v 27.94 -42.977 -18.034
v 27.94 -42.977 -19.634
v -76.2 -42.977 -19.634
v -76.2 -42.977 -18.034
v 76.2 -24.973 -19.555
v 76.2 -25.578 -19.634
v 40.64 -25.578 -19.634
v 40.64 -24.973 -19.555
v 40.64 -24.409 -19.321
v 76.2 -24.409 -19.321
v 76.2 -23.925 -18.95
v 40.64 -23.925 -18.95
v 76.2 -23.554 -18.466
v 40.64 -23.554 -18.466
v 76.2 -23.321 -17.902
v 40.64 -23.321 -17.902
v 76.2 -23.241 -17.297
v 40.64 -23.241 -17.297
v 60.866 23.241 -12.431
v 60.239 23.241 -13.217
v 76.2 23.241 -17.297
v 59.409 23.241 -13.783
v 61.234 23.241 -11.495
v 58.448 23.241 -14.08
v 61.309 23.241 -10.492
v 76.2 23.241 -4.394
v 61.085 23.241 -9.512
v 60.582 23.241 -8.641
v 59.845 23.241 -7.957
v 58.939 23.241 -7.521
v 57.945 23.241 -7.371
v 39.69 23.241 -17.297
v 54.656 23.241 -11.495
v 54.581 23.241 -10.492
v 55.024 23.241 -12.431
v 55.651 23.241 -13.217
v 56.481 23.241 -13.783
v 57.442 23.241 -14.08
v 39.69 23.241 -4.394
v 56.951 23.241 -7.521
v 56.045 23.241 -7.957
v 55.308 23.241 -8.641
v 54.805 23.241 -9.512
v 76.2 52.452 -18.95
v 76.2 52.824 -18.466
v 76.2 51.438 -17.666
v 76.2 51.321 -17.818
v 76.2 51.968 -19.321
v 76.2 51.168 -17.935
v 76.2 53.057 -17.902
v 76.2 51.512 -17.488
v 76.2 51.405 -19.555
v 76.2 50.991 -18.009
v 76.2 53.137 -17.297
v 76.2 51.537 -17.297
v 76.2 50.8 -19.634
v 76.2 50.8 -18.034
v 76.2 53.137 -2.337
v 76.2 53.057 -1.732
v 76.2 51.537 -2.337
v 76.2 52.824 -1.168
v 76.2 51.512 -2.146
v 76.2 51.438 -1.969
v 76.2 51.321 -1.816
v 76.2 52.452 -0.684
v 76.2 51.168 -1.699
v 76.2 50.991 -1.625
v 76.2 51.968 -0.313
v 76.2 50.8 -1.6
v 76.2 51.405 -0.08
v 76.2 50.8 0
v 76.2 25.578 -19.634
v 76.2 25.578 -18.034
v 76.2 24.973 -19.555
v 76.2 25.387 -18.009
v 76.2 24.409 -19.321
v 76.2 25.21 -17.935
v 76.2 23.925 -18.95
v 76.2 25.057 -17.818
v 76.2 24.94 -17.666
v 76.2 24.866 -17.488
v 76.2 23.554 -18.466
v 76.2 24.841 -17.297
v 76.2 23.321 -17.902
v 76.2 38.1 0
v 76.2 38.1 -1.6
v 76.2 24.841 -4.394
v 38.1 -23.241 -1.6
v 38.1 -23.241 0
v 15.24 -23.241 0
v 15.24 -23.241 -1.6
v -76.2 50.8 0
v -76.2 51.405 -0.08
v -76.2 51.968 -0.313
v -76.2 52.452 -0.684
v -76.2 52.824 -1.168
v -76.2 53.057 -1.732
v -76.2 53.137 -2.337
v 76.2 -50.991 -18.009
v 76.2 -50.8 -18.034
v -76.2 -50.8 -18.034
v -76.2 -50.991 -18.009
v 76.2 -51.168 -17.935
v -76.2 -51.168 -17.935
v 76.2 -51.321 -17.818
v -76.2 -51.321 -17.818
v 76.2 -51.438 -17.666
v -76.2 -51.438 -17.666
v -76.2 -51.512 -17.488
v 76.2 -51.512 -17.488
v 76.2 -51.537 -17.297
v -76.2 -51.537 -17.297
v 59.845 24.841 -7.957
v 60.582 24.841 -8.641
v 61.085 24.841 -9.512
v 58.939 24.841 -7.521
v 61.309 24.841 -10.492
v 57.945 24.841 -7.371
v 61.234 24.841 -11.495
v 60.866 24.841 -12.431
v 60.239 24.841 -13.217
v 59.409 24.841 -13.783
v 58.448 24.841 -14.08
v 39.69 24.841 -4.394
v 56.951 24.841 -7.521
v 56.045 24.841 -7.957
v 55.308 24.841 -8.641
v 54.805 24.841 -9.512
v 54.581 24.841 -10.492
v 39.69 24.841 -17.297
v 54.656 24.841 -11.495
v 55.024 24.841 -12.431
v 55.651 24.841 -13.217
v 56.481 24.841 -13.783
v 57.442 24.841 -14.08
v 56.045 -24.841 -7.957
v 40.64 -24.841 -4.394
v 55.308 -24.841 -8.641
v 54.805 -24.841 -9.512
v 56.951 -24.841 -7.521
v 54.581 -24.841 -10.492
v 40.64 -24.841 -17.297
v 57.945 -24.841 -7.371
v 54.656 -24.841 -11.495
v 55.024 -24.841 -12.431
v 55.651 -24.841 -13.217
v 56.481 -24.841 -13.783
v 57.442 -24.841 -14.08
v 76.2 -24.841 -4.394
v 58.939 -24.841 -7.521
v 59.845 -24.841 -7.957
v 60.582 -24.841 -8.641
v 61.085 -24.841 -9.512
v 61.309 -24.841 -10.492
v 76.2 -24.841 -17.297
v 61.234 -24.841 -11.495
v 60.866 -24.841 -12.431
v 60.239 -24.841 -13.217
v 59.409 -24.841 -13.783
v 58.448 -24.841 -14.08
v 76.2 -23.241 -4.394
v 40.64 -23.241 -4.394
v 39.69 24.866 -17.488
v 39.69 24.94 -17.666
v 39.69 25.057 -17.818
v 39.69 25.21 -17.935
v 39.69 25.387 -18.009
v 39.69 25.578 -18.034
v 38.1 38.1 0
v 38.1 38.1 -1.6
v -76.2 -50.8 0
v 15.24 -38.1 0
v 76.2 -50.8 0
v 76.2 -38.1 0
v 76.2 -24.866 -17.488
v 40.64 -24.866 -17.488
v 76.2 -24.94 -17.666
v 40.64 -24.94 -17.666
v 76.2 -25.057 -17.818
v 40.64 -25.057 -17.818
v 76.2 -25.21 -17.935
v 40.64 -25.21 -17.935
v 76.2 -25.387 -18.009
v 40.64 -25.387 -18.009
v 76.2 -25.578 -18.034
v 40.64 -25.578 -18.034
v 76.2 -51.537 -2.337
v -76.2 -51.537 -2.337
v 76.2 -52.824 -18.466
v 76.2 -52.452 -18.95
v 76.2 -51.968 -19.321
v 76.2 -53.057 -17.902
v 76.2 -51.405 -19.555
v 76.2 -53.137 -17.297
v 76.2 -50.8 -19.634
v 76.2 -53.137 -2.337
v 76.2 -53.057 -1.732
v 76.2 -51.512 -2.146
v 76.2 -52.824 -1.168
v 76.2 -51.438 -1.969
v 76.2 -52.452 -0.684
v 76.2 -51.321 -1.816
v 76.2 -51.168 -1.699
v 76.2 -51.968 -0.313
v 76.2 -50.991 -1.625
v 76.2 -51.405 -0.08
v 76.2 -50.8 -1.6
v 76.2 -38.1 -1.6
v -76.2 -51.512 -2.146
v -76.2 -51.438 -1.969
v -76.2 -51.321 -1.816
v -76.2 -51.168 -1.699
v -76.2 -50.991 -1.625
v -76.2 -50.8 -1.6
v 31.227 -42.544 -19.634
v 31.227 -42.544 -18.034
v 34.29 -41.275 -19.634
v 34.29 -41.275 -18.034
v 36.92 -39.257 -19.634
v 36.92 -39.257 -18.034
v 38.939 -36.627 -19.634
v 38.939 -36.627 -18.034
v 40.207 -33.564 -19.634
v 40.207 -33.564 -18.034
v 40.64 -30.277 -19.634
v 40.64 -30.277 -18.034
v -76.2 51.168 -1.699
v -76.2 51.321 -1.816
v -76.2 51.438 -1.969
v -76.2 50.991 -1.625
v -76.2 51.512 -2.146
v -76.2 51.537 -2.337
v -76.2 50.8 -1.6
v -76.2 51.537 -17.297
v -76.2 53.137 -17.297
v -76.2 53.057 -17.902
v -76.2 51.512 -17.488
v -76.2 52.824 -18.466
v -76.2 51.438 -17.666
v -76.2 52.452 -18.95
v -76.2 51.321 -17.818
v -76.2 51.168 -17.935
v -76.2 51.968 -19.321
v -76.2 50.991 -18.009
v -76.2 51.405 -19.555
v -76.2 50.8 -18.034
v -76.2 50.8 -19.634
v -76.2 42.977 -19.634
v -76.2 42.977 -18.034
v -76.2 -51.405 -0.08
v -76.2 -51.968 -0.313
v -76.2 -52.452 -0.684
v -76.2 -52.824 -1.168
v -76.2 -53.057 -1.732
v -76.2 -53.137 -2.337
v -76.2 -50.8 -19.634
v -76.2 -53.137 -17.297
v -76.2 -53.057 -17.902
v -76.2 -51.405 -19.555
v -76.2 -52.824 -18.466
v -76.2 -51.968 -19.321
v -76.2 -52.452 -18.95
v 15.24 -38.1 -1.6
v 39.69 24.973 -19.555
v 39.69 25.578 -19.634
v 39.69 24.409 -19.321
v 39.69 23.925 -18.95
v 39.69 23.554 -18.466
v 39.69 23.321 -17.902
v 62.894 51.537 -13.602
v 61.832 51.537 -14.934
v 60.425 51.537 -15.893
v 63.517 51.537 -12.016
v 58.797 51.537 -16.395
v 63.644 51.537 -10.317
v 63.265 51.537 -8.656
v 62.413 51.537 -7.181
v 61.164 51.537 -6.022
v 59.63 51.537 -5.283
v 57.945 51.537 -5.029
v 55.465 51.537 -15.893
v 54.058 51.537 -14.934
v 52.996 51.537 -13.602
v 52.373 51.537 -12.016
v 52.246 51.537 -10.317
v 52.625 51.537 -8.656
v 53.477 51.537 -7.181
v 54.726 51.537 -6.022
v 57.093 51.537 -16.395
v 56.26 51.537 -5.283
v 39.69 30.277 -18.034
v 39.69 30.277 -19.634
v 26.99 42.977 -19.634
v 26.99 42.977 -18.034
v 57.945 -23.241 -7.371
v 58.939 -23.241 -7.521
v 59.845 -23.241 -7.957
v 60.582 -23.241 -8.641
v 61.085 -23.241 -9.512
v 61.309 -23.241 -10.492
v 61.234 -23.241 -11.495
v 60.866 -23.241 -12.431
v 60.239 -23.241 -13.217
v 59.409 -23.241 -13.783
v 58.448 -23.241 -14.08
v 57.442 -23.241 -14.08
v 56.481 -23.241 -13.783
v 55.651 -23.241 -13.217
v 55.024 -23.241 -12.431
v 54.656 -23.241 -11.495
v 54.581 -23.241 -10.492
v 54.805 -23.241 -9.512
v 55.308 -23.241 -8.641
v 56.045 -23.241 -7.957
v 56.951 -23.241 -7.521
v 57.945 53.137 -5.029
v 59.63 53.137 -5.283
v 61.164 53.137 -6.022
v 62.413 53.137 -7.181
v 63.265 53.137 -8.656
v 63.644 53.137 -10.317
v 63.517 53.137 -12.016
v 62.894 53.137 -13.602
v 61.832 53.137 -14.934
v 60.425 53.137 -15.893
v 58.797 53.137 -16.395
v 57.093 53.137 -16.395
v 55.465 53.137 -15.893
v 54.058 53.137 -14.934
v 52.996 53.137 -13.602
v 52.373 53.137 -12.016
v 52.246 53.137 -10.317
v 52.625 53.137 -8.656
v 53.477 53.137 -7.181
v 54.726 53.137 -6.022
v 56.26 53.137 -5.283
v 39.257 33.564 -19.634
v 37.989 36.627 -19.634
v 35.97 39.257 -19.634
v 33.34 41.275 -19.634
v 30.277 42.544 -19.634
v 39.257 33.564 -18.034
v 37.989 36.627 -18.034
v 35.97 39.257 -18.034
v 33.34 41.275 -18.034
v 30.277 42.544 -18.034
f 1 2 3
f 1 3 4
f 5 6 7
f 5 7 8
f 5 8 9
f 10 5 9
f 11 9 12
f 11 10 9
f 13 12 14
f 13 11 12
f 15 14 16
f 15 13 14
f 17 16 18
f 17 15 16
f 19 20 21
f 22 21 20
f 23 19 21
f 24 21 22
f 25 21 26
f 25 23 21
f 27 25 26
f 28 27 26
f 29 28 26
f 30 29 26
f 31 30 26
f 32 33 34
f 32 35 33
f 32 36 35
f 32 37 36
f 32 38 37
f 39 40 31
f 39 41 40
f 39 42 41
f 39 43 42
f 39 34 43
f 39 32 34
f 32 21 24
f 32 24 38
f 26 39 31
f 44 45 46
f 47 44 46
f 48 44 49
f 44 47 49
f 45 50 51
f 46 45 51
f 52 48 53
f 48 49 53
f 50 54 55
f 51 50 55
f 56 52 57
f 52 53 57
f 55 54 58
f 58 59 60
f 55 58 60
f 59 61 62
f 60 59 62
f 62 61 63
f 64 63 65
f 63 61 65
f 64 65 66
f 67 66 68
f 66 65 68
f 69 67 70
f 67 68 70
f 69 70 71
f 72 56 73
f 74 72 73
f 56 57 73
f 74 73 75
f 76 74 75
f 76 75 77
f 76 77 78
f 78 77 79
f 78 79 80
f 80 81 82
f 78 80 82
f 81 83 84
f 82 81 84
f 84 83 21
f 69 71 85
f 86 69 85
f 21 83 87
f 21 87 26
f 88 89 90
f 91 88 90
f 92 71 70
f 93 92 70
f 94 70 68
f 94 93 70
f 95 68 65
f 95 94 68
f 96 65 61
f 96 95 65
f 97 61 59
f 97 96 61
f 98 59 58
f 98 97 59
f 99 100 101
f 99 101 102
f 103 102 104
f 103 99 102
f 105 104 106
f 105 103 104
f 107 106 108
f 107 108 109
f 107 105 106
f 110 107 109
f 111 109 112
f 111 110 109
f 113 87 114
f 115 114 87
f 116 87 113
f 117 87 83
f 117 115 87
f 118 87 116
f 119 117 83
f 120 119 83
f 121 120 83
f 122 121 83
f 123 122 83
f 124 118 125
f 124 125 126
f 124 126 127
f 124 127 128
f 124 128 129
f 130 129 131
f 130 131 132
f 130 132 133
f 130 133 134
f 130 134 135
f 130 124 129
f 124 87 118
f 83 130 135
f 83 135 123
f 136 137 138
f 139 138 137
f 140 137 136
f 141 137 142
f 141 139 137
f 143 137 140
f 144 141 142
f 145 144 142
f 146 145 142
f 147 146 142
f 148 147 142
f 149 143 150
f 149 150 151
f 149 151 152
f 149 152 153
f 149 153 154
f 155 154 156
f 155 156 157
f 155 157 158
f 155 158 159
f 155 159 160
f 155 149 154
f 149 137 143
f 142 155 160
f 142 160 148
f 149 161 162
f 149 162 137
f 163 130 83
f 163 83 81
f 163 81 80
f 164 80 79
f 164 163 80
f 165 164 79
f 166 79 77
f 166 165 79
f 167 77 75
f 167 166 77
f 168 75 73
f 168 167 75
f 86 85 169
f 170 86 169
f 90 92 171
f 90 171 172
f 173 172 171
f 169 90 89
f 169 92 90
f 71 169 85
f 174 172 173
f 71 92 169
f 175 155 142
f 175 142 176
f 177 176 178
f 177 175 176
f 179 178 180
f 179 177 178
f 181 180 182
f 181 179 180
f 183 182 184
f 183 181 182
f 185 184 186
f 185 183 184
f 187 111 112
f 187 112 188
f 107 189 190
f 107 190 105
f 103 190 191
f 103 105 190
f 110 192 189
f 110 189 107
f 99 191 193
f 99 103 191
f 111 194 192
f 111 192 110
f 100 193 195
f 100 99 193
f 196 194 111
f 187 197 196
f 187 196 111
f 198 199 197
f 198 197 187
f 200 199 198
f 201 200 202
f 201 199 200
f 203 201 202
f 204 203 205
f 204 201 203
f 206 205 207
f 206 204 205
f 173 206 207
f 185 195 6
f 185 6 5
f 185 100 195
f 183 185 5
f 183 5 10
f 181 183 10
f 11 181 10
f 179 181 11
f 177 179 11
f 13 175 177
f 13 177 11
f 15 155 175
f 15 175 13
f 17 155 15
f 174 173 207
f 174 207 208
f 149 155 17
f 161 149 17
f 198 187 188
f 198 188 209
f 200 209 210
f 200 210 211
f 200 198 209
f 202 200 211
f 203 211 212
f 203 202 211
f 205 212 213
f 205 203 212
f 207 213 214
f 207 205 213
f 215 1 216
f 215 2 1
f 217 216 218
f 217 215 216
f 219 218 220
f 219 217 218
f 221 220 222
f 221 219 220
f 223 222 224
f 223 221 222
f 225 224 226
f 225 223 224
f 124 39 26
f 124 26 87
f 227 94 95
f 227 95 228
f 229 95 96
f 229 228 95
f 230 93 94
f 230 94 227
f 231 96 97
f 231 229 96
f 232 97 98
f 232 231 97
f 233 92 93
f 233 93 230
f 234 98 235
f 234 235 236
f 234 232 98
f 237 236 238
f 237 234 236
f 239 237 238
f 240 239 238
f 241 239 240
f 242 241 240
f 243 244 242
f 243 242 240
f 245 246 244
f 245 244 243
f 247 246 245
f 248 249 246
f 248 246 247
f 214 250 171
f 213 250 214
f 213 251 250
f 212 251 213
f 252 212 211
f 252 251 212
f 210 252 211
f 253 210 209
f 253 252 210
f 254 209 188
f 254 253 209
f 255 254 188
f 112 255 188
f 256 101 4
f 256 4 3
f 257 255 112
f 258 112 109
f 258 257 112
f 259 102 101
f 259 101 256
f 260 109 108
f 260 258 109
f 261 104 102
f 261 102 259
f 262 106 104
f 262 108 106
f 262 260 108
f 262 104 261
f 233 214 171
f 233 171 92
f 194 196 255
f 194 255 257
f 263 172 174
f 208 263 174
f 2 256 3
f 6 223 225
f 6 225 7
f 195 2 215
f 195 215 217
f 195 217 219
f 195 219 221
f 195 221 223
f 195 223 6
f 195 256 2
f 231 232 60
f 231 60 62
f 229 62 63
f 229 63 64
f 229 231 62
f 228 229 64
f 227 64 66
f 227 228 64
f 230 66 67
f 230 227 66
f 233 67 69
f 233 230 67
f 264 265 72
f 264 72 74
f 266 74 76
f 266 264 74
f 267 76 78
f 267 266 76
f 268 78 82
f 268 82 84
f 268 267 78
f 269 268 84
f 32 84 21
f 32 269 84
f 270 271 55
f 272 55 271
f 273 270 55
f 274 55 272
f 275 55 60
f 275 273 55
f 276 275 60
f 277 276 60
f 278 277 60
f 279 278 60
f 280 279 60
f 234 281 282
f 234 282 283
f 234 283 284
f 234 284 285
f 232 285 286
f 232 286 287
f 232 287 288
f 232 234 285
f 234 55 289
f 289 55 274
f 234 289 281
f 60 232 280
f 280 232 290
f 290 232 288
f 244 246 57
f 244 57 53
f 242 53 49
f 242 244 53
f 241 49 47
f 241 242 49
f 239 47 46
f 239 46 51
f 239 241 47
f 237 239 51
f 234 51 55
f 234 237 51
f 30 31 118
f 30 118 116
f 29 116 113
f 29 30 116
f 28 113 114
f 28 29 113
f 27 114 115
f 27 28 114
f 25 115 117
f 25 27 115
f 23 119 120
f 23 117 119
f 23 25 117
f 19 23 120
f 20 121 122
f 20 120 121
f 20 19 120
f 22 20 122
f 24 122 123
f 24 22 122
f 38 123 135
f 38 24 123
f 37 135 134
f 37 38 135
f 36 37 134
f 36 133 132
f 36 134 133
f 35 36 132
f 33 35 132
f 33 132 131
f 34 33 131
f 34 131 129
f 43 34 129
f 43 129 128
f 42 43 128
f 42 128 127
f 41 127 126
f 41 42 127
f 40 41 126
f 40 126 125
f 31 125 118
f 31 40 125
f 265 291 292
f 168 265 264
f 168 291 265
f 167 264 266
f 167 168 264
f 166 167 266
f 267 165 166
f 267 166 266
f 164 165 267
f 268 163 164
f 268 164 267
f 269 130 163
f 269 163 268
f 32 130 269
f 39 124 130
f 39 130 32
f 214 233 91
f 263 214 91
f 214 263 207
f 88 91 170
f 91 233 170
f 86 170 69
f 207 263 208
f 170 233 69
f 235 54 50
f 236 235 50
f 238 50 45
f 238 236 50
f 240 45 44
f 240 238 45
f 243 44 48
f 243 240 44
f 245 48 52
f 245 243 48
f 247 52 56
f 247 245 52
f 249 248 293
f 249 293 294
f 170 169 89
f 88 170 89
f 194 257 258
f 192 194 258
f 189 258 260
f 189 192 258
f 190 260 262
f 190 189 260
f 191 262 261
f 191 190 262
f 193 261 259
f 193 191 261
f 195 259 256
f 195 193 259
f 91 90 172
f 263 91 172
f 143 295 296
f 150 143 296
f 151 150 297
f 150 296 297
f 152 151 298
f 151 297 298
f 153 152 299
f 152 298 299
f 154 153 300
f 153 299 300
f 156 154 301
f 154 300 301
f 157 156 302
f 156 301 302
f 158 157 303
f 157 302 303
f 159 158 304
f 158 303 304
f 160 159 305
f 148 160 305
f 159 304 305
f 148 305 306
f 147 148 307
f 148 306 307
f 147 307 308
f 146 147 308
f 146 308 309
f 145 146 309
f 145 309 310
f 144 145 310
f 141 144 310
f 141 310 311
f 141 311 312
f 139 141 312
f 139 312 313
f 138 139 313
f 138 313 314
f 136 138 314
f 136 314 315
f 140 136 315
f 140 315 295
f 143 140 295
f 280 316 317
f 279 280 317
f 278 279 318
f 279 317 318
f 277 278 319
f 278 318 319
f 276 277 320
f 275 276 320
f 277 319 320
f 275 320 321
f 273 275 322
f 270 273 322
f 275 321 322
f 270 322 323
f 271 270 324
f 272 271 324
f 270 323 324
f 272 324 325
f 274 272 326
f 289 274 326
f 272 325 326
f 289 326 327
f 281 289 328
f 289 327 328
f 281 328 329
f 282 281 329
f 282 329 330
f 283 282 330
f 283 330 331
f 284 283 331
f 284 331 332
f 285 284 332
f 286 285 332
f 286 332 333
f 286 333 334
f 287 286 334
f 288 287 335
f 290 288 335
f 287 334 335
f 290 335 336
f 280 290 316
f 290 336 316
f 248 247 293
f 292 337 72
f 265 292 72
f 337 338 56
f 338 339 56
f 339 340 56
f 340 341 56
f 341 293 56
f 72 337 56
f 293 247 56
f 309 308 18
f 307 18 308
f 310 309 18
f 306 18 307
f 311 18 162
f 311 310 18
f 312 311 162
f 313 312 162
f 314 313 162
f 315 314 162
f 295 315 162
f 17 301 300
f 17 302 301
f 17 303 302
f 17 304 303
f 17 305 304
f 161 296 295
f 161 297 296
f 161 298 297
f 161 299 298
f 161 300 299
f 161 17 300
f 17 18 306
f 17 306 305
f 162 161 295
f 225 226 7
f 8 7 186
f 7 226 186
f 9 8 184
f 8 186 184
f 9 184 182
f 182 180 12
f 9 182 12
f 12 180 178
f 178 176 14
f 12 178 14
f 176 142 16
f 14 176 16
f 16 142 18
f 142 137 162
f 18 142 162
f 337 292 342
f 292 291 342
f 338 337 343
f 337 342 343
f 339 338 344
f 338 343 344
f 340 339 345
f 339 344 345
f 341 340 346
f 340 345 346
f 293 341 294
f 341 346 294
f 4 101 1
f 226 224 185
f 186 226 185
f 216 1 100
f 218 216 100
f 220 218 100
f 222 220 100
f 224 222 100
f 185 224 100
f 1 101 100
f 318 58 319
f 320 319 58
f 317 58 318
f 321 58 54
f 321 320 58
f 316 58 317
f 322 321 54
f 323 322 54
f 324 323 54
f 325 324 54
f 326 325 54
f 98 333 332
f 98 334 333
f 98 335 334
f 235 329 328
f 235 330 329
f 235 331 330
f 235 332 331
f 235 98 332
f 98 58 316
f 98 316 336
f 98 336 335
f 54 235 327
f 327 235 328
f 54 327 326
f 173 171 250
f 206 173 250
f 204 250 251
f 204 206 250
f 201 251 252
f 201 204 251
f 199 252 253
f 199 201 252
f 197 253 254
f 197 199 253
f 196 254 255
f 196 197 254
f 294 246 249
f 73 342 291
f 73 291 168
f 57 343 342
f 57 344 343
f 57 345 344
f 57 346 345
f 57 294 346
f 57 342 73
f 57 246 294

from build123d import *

# Parameters (mm, degrees)
SKETCH1_W                      = 152.4
SKETCH1_H                      = 101.6
BASE_FLANGE1_DEPTH             = 1.6002
EDGE_FLANGE1_DEPTH             = 152.4
EDGE_FLANGE2_DEPTH             = 152.4
CUT_EXTRUDE1_DEPTH             = 95.949783169
EDGE_FLANGE7_STRIP_W           = 7.874
EDGE_FLANGE7_STRIP_H           = 1.6002
EDGE_FLANGE7_STRIP_CUT_DEPTH   = 152.4
EDGE_FLANGE7_DEPTH             = 152.4
EDGE_FLANGE8_STRIP_W           = 7.874
EDGE_FLANGE8_STRIP_H           = 1.6002
EDGE_FLANGE8_STRIP_CUT_DEPTH   = 152.4
EDGE_FLANGE8_DEPTH             = 152.4
SKETCH35_W                     = 35.56
SKETCH35_H                     = 1.6002
BOSS_EXTRUDE1_DEPTH            = 19.7358
EDGE_FLANGE9_STRIP_W           = 7.874
EDGE_FLANGE9_STRIP_H           = 1.6002
EDGE_FLANGE9_STRIP_CUT_DEPTH   = 35.56
EDGE_FLANGE9_DEPTH             = 35.56
SKETCH39_W                     = 36.50996
SKETCH39_H                     = 1.6002
BOSS_EXTRUDE2_DEPTH            = 19.7358
EDGE_FLANGE10_STRIP_W          = 7.874
EDGE_FLANGE10_STRIP_H          = 1.6002
EDGE_FLANGE10_STRIP_CUT_DEPTH  = 36.50996
EDGE_FLANGE10_DEPTH            = 36.50996
CUT_EXTRUDE2_REACH             = 111.661
SKETCH43_R                     = 3.37312
CUT_EXTRUDE2_DIRECTION_2_REACH = 111.661
FILLET1_R                      = 12.7
SKETCH45_R                     = 5.715
CUT_EXTRUDE3_DEPTH             = 1.6002


# Sheet-metal steps are written as plain solids
with BuildPart() as part:
    # Sketch1 → Base-Flange1 (new body)
    with BuildSketch(Plane.XY):
        Rectangle(SKETCH1_W, SKETCH1_H)
    extrude(amount=-BASE_FLANGE1_DEPTH)

    # Edge-Flange1 section (across the edge) → Edge-Flange1 (add)
    with BuildSketch(Plane(origin=(-76.2, 51.5366, -1.6002), x_dir=(0, -1, 0), z_dir=(1, 0, 0))):
        with BuildLine():
            Line((-1.6002, 0.7366), (-1.6002, 18.034))
            Line((-1.6002, 18.034), (0, 18.034))
            Line((0, 18.034), (0, 0.7366))
            ThreePointArc((0, 0.7366), (0.215745145, 0.215745145), (0.7366, 0))
            Line((0.7366, 0), (0.7366, -1.6002))
            ThreePointArc((0.7366, -1.6002), (-0.915767126, -0.915767126), (-1.6002, 0.7366))
        make_face()
    extrude(amount=EDGE_FLANGE1_DEPTH)

    # Edge-Flange2 section (across the edge) → Edge-Flange2 (add)
    with BuildSketch(Plane(origin=(76.2, -51.5366, -1.6002), x_dir=(0, 1, 0), z_dir=(-1, 0, 0))):
        with BuildLine():
            Line((-1.6002, 0.7366), (-1.6002, 18.034))
            Line((-1.6002, 18.034), (0, 18.034))
            Line((0, 18.034), (0, 0.7366))
            ThreePointArc((0, 0.7366), (0.215745145, 0.215745145), (0.7366, 0))
            Line((0.7366, 0), (0.7366, -1.6002))
            ThreePointArc((0.7366, -1.6002), (-0.915767126, -0.915767126), (-1.6002, 0.7366))
        make_face()
    extrude(amount=EDGE_FLANGE2_DEPTH)

    # Sketch14 → Cut-Extrude1 (cut, through all)
    with BuildSketch(Plane.XY):
        Polygon((76.2, -38.1), (76.2, 38.1), (38.1, 38.1), (38.1, -23.241), (15.24, -23.241), (15.24, -38.1), align=None)
    extrude(amount=-CUT_EXTRUDE1_DEPTH, mode=Mode.SUBTRACT)

    # Edge-Flange7 strip (across the edge) → Edge-Flange7 strip cut (cut)
    with BuildSketch(Plane(origin=(76.2, -51.5366, -19.6342), x_dir=(0, 0, 1), z_dir=(-1, 0, 0))):
        with Locations((-1.6002, -0.8001)):
            Rectangle(EDGE_FLANGE7_STRIP_W, EDGE_FLANGE7_STRIP_H)
    extrude(amount=EDGE_FLANGE7_STRIP_CUT_DEPTH, mode=Mode.SUBTRACT)

    # Edge-Flange7 section (across the edge) → Edge-Flange7 (add)
    with BuildSketch(Plane(origin=(76.2, -51.5366, -19.6342), x_dir=(0, 0, 1), z_dir=(-1, 0, 0))):
        with BuildLine():
            Line((0, 0.7366), (0, 8.5598))
            Line((0, 8.5598), (1.6002, 8.5598))
            Line((1.6002, 8.5598), (1.6002, 0.7366))
            ThreePointArc((1.6002, 0.7366), (1.815945145, 0.215745145), (2.3368, 0))
            Line((2.3368, 0), (2.3368, -1.6002))
            ThreePointArc((2.3368, -1.6002), (0.684432874, -0.915767126), (0, 0.7366))
        make_face()
    extrude(amount=EDGE_FLANGE7_DEPTH)

    # Edge-Flange8 strip (across the edge) → Edge-Flange8 strip cut (cut)
    with BuildSketch(Plane(origin=(-76.2, 51.5366, -19.6342), x_dir=(0, 0, 1), z_dir=(1, 0, 0))):
        with Locations((-1.6002, -0.8001)):
            Rectangle(EDGE_FLANGE8_STRIP_W, EDGE_FLANGE8_STRIP_H)
    extrude(amount=EDGE_FLANGE8_STRIP_CUT_DEPTH, mode=Mode.SUBTRACT)

    # Edge-Flange8 section (across the edge) → Edge-Flange8 (add)
    with BuildSketch(Plane(origin=(-76.2, 51.5366, -19.6342), x_dir=(0, 0, 1), z_dir=(1, 0, 0))):
        with BuildLine():
            Line((0, 0.7366), (0, 8.5598))
            Line((0, 8.5598), (1.6002, 8.5598))
            Line((1.6002, 8.5598), (1.6002, 0.7366))
            ThreePointArc((1.6002, 0.7366), (1.815945145, 0.215745145), (2.3368, 0))
            Line((2.3368, 0), (2.3368, -1.6002))
            ThreePointArc((2.3368, -1.6002), (0.684432874, -0.915767126), (0, 0.7366))
        make_face()
    extrude(amount=EDGE_FLANGE8_DEPTH)

    # Sketch35 → Boss-Extrude1 (add)
    with BuildSketch(Plane(origin=(0, -42.9768, 0), x_dir=(1, 0, 0), z_dir=(0, 1, 0))):
        with Locations((58.42, 18.8341)):
            Rectangle(SKETCH35_W, SKETCH35_H)
    extrude(amount=BOSS_EXTRUDE1_DEPTH)

    # Edge-Flange9 strip (across the edge) → Edge-Flange9 strip cut (cut)
    with BuildSketch(Plane(origin=(76.2, -23.241, -18.034), x_dir=(0, -1, 0), z_dir=(-1, 0, 0))):
        with Locations((-1.6002, -0.8001)):
            Rectangle(EDGE_FLANGE9_STRIP_W, EDGE_FLANGE9_STRIP_H)
    extrude(amount=EDGE_FLANGE9_STRIP_CUT_DEPTH, mode=Mode.SUBTRACT)

    # Edge-Flange9 section (across the edge) → Edge-Flange9 (add)
    with BuildSketch(Plane(origin=(76.2, -23.241, -18.034), x_dir=(0, -1, 0), z_dir=(-1, 0, 0))):
        with BuildLine():
            Line((0, 0.7366), (0, 13.6398))
            Line((0, 13.6398), (1.6002, 13.6398))
            Line((1.6002, 13.6398), (1.6002, 0.7366))
            ThreePointArc((1.6002, 0.7366), (1.815945145, 0.215745145), (2.3368, 0))
            Line((2.3368, 0), (2.3368, -1.6002))
            ThreePointArc((2.3368, -1.6002), (0.684432874, -0.915767126), (0, 0.7366))
        make_face()
    extrude(amount=EDGE_FLANGE9_DEPTH)

    # Sketch39 → Boss-Extrude2 (add)
    with BuildSketch(Plane.XZ.offset(-42.9768)):
        with Locations((57.94502, -18.8341)):
            Rectangle(SKETCH39_W, SKETCH39_H)
    extrude(amount=BOSS_EXTRUDE2_DEPTH)

    # Edge-Flange10 strip (across the edge) → Edge-Flange10 strip cut (cut)
    with BuildSketch(Plane(origin=(39.69004, 23.241, -18.034), x_dir=(0, 1, 0), z_dir=(1, 0, 0))):
        with Locations((-1.6002, -0.8001)):
            Rectangle(EDGE_FLANGE10_STRIP_W, EDGE_FLANGE10_STRIP_H)
    extrude(amount=EDGE_FLANGE10_STRIP_CUT_DEPTH, mode=Mode.SUBTRACT)

    # Edge-Flange10 section (across the edge) → Edge-Flange10 (add)
    with BuildSketch(Plane(origin=(39.69004, 23.241, -18.034), x_dir=(0, 1, 0), z_dir=(1, 0, 0))):
        with BuildLine():
            Line((0, 0.7366), (0, 13.6398))
            Line((0, 13.6398), (1.6002, 13.6398))
            Line((1.6002, 13.6398), (1.6002, 0.7366))
            ThreePointArc((1.6002, 0.7366), (1.815945145, 0.215745145), (2.3368, 0))
            Line((2.3368, 0), (2.3368, -1.6002))
            ThreePointArc((2.3368, -1.6002), (0.684432874, -0.915767126), (0, 0.7366))
        make_face()
    extrude(amount=EDGE_FLANGE10_DEPTH)

    # Cut-Extrude2: up to this face of the body (flat: up to its plane)
    cut_extrude2_end = Plane(part.part.faces().sort_by_distance((58.42, -24.8412, -10.8458))[0])
    # Sketch43 → Cut-Extrude2 (cut, up to the picked face)
    with BuildSketch(Plane(origin=(0, -23.241, 0), x_dir=(1, 0, 0), z_dir=(0, 1, 0)), mode=Mode.PRIVATE) as cut_extrude2_sk1:
        with Locations(Location((57.94502, 10.7442, 0), (0, 0, 270))):
            Circle(SKETCH43_R)
    cut_extrude2_tool1 = split(extrude(cut_extrude2_sk1.sketch, amount=-CUT_EXTRUDE2_REACH, mode=Mode.PRIVATE), bisect_by=cut_extrude2_end, keep=Keep.BOTH, mode=Mode.PRIVATE)
    add(cut_extrude2_tool1.solids().sort_by(Axis((57.94502, -23.241, -10.7442), (0, -1, 0)))[0], mode=Mode.SUBTRACT)

    # Cut-Extrude2 direction 2: up to this face of the body (flat: up to its plane)
    cut_extrude2_direction_2_end = Plane(part.part.faces().sort_by_distance((57.94502, 24.8412, -10.8458))[0])
    # Sketch43 → Cut-Extrude2 direction 2 (cut, up to the picked face)
    with BuildSketch(Plane(origin=(0, -23.241, 0), x_dir=(1, 0, 0), z_dir=(0, 1, 0)), mode=Mode.PRIVATE) as cut_extrude2_direction_2_sk1:
        with Locations(Location((57.94502, 10.7442, 0), (0, 0, 270))):
            Circle(SKETCH43_R)
    cut_extrude2_direction_2_tool1 = split(extrude(cut_extrude2_direction_2_sk1.sketch, amount=CUT_EXTRUDE2_DIRECTION_2_REACH, mode=Mode.PRIVATE), bisect_by=cut_extrude2_direction_2_end, keep=Keep.BOTH, mode=Mode.PRIVATE)
    add(cut_extrude2_direction_2_tool1.solids().sort_by(Axis((57.94502, -23.241, -10.7442), (0, 1, 0)))[0], mode=Mode.SUBTRACT)

    # Fillet1
    fillet1_edges = [part.edges().sort_by_distance(p)[0] for p in [
        (40.64, -42.9768, -18.8341),
        (39.69004, 42.9768, -18.8341),
    ]]
    fillet(fillet1_edges, radius=FILLET1_R)

    # Sketch45 → Cut-Extrude3 (cut)
    with BuildSketch(Plane(origin=(0, 53.1368, 0), x_dir=(1, 0, 0), z_dir=(0, 1, 0))):
        with Locations(Location((57.94502, 10.7442, 0), (0, 0, 270))):
            Circle(SKETCH45_R)
    extrude(amount=-CUT_EXTRUDE3_DEPTH, mode=Mode.SUBTRACT)


solid = part.part
